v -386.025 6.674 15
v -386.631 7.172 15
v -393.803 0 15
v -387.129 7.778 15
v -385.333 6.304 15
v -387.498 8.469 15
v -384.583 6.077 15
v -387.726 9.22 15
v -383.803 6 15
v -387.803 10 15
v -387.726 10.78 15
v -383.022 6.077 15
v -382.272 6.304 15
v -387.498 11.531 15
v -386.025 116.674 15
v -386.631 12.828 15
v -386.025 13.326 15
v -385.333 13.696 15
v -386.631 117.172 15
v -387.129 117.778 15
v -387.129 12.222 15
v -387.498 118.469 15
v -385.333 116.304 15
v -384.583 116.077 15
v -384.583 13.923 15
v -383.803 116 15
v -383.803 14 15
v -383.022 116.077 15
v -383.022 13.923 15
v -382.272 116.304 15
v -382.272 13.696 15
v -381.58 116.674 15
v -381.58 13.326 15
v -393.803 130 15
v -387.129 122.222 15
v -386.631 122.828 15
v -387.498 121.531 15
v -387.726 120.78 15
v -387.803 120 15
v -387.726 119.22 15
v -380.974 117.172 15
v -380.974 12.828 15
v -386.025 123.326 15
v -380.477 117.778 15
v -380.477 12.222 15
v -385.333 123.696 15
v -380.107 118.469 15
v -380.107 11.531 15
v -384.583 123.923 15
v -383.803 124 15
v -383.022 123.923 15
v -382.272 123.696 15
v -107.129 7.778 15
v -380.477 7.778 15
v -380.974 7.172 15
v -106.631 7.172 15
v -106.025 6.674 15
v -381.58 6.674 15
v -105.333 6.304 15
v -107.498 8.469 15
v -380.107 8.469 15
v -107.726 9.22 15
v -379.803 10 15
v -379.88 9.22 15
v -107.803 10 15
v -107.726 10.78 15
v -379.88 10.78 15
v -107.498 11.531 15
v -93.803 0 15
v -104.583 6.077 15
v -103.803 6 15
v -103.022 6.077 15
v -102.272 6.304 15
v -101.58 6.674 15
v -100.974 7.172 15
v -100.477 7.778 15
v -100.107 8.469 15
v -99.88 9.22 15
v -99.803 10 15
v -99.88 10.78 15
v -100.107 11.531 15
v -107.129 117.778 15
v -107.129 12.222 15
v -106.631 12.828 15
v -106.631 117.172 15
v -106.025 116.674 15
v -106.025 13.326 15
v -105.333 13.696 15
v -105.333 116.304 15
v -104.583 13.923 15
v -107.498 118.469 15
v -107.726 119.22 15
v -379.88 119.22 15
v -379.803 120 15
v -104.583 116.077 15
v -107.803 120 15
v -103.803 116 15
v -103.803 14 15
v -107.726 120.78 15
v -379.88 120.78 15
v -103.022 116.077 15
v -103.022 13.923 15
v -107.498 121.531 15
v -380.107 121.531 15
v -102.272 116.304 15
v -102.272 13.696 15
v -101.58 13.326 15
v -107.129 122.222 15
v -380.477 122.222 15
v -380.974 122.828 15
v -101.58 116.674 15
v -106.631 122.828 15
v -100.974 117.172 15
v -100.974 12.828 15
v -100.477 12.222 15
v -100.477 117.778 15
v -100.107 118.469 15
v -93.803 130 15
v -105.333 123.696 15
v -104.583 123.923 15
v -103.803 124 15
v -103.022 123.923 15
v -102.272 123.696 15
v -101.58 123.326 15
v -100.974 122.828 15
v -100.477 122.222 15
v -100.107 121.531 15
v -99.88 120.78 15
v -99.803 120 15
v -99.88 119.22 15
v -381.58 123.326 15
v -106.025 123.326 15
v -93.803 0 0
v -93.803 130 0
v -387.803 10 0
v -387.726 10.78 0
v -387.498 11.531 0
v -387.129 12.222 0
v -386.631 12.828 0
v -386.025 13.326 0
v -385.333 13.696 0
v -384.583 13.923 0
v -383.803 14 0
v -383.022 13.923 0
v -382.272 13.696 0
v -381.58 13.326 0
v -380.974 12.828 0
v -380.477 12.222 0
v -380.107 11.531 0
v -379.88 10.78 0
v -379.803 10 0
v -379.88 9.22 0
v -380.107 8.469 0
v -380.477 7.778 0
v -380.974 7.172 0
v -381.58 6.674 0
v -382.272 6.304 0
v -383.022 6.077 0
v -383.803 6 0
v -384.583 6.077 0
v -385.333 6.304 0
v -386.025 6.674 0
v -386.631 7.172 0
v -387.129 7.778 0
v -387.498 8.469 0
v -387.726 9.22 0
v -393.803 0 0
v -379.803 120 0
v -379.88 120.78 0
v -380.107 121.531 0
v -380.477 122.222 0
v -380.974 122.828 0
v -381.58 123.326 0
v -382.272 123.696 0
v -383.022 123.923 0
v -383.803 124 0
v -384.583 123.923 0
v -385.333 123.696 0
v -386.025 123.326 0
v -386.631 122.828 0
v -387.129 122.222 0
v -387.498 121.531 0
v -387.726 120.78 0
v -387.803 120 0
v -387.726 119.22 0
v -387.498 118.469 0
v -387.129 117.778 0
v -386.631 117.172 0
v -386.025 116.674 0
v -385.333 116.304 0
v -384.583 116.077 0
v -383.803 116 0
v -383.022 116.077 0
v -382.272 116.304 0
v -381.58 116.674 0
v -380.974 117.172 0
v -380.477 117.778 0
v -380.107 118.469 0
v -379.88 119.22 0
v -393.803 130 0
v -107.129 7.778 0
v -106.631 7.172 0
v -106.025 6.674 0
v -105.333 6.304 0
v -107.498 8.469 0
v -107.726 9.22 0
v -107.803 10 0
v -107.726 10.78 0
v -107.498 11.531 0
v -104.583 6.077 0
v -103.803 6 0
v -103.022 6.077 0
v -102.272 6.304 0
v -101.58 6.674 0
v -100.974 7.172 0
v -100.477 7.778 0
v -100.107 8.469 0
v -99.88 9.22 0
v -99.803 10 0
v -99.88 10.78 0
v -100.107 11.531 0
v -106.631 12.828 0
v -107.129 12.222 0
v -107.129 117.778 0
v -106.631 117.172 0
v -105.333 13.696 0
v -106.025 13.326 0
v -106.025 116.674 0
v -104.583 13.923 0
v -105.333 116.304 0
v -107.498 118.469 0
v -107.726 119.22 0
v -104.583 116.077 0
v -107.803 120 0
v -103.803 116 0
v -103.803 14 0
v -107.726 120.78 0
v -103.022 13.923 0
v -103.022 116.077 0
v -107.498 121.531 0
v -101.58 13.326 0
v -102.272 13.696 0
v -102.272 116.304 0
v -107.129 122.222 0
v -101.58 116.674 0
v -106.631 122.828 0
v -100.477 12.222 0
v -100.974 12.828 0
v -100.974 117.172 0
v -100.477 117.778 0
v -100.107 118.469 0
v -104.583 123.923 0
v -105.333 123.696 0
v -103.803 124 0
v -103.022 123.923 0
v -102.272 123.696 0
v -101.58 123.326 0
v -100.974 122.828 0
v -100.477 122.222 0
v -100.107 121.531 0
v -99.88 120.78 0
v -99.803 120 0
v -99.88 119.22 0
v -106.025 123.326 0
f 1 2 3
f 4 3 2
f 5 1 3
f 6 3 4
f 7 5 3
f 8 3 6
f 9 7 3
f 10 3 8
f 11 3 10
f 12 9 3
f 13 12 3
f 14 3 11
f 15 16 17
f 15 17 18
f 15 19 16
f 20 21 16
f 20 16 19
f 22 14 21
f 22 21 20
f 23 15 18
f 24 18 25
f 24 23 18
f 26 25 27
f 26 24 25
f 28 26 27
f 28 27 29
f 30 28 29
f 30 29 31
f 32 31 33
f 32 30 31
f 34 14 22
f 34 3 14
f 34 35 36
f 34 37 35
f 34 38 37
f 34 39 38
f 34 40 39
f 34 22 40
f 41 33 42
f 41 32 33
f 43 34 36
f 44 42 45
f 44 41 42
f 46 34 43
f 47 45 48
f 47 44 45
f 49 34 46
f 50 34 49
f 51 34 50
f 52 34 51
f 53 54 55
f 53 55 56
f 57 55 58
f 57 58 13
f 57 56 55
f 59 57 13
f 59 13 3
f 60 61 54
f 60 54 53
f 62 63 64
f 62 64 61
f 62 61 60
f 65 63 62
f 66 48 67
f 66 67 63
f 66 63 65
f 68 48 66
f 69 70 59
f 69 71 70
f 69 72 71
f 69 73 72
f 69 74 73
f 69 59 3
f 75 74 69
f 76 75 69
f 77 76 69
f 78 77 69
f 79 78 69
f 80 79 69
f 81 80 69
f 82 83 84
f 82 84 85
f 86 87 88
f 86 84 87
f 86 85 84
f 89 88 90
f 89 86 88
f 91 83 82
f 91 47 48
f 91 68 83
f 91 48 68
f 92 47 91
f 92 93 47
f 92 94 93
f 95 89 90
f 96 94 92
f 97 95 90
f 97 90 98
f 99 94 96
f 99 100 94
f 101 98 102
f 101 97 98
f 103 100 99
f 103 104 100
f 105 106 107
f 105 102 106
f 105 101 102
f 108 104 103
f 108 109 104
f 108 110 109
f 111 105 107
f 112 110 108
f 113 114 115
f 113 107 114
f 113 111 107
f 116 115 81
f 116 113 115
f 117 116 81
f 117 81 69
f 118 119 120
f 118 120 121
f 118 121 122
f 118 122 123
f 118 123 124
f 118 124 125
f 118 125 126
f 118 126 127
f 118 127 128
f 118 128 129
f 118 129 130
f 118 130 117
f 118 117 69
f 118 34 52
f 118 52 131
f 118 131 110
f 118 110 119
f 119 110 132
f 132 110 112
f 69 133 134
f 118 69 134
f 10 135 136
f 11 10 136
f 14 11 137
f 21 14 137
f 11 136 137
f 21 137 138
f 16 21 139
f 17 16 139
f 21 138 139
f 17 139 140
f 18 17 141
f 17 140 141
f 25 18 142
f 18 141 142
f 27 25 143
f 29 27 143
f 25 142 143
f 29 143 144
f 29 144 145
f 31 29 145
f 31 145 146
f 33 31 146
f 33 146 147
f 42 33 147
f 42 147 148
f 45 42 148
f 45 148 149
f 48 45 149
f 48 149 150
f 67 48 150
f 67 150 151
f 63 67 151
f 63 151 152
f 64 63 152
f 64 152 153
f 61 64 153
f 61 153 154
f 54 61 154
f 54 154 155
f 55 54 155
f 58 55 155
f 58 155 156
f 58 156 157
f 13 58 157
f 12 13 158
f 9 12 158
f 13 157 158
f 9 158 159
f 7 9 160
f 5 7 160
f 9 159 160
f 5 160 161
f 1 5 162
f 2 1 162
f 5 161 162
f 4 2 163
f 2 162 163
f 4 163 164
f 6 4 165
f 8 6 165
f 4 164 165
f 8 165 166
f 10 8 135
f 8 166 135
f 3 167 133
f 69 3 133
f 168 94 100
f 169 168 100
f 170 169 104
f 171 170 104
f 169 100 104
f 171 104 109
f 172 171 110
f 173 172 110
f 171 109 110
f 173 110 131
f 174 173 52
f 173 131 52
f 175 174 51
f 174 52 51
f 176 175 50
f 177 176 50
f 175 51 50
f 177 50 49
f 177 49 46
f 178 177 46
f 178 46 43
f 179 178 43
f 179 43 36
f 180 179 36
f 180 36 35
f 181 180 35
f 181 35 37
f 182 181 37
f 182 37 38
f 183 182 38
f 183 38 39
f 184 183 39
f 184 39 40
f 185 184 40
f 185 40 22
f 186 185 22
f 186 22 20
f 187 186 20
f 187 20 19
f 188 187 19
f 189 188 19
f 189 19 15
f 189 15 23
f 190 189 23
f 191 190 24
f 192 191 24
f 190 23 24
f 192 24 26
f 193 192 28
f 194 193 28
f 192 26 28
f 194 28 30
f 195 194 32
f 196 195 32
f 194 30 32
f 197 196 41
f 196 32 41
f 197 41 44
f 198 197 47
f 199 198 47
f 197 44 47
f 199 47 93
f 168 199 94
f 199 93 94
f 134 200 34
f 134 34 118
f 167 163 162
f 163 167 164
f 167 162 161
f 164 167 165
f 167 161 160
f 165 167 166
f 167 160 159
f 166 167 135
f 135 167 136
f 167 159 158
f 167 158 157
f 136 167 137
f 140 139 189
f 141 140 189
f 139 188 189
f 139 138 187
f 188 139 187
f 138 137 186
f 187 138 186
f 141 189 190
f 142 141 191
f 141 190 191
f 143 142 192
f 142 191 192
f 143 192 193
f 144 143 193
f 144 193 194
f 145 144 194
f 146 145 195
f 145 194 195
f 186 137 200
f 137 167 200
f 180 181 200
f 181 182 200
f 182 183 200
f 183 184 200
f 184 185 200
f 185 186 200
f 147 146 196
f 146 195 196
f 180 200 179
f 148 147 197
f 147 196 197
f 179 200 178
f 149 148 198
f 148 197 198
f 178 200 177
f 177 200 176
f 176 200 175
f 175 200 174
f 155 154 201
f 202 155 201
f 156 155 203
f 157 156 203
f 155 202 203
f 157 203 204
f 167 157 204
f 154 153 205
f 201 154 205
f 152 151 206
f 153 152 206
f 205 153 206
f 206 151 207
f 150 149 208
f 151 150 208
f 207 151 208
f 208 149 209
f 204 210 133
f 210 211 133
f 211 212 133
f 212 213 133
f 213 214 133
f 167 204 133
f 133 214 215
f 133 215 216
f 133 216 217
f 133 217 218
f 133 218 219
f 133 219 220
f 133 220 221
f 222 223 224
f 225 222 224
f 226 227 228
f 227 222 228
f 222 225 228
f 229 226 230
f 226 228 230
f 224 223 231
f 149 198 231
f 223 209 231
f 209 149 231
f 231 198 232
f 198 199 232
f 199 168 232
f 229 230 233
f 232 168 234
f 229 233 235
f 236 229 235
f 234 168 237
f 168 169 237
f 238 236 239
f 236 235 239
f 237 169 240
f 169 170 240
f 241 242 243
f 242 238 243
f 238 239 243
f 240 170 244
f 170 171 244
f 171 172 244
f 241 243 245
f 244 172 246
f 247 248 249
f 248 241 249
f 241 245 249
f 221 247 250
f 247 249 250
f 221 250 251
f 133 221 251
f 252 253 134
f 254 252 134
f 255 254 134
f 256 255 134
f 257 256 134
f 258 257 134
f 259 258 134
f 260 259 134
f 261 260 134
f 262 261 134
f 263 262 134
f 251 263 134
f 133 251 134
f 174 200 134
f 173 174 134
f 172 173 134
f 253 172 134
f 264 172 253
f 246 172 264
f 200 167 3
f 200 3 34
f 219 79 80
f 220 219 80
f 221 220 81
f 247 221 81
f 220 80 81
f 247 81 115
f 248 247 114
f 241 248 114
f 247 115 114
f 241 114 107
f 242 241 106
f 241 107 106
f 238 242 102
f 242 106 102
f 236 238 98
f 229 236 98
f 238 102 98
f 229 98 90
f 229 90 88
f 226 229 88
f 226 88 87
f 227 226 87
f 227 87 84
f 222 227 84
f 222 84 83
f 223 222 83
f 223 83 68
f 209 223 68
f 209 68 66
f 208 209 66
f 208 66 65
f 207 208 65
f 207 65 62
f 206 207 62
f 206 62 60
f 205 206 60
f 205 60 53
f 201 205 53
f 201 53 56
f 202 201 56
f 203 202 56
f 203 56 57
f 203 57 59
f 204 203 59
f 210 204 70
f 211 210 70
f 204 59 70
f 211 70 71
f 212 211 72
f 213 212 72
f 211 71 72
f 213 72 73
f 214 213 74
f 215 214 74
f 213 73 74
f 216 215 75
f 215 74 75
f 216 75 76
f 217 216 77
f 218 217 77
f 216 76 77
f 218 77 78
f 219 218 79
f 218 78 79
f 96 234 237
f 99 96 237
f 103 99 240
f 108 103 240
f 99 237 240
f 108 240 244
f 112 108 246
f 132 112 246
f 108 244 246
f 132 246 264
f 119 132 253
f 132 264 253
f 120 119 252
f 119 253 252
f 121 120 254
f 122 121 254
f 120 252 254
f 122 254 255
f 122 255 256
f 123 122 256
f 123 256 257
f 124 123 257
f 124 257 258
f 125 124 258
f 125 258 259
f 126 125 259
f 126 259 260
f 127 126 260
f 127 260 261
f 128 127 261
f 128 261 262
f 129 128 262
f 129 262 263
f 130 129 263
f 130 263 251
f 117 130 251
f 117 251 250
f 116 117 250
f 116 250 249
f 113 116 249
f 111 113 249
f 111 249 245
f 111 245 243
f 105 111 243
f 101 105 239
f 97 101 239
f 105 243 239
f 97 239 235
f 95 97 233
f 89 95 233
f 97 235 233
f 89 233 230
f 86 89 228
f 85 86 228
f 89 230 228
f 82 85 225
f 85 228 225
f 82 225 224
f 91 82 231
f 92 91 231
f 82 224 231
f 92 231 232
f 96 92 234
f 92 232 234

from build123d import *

# Parameters (mm, degrees)
ESQUISSE1_W             = 300
ESQUISSE1_H             = 130
BOSS_EXTRU_1_DEPTH      = 15
ESQUISSE2_R             = 4
ENL_V_MAT_EXTRU_2_DEPTH = 415.976615042
ESQUISSE3_R             = 4
ENL_V_MAT_EXTRU_3_DEPTH = 415.976615042
ESQUISSE5_R             = 4
ENL_V_MAT_EXTRU_4_DEPTH = 415.976615042


with BuildPart() as part:
    # Esquisse1 → Boss.-Extru.1 (new body)
    with BuildSketch(Plane.XY):
        with Locations((-243.802731113, 65)):
            Rectangle(ESQUISSE1_W, ESQUISSE1_H)
    extrude(amount=BOSS_EXTRU_1_DEPTH)

    # Esquisse2 → Enlèv. mat.-Extru.2 (cut, through all)
    with BuildSketch(Plane.XY.offset(15)):
        with Locations((-383.802731113, 120)):
            Circle(ESQUISSE2_R)
    extrude(amount=-ENL_V_MAT_EXTRU_2_DEPTH, mode=Mode.SUBTRACT)

    # Esquisse3 → Enlèv. mat.-Extru.3 (cut, through all)
    with BuildSketch(Plane.XY.offset(15)):
        with Locations((-103.802731113, 10)):
            Circle(ESQUISSE3_R)
    extrude(amount=-ENL_V_MAT_EXTRU_3_DEPTH, mode=Mode.SUBTRACT)

    # Esquisse5 → Enlèv. mat.-Extru.4 (cut, through all)
    with BuildSketch(Plane(origin=(0, 0, 0), x_dir=(-1, 0, 0), z_dir=(0, 0, -1))):
        with Locations((103.802731113, 120)):
            Circle(ESQUISSE5_R)
        with Locations((383.802731113, 10)):
            Circle(ESQUISSE5_R)
    extrude(amount=-ENL_V_MAT_EXTRU_4_DEPTH, mode=Mode.SUBTRACT)


solid = part.part
